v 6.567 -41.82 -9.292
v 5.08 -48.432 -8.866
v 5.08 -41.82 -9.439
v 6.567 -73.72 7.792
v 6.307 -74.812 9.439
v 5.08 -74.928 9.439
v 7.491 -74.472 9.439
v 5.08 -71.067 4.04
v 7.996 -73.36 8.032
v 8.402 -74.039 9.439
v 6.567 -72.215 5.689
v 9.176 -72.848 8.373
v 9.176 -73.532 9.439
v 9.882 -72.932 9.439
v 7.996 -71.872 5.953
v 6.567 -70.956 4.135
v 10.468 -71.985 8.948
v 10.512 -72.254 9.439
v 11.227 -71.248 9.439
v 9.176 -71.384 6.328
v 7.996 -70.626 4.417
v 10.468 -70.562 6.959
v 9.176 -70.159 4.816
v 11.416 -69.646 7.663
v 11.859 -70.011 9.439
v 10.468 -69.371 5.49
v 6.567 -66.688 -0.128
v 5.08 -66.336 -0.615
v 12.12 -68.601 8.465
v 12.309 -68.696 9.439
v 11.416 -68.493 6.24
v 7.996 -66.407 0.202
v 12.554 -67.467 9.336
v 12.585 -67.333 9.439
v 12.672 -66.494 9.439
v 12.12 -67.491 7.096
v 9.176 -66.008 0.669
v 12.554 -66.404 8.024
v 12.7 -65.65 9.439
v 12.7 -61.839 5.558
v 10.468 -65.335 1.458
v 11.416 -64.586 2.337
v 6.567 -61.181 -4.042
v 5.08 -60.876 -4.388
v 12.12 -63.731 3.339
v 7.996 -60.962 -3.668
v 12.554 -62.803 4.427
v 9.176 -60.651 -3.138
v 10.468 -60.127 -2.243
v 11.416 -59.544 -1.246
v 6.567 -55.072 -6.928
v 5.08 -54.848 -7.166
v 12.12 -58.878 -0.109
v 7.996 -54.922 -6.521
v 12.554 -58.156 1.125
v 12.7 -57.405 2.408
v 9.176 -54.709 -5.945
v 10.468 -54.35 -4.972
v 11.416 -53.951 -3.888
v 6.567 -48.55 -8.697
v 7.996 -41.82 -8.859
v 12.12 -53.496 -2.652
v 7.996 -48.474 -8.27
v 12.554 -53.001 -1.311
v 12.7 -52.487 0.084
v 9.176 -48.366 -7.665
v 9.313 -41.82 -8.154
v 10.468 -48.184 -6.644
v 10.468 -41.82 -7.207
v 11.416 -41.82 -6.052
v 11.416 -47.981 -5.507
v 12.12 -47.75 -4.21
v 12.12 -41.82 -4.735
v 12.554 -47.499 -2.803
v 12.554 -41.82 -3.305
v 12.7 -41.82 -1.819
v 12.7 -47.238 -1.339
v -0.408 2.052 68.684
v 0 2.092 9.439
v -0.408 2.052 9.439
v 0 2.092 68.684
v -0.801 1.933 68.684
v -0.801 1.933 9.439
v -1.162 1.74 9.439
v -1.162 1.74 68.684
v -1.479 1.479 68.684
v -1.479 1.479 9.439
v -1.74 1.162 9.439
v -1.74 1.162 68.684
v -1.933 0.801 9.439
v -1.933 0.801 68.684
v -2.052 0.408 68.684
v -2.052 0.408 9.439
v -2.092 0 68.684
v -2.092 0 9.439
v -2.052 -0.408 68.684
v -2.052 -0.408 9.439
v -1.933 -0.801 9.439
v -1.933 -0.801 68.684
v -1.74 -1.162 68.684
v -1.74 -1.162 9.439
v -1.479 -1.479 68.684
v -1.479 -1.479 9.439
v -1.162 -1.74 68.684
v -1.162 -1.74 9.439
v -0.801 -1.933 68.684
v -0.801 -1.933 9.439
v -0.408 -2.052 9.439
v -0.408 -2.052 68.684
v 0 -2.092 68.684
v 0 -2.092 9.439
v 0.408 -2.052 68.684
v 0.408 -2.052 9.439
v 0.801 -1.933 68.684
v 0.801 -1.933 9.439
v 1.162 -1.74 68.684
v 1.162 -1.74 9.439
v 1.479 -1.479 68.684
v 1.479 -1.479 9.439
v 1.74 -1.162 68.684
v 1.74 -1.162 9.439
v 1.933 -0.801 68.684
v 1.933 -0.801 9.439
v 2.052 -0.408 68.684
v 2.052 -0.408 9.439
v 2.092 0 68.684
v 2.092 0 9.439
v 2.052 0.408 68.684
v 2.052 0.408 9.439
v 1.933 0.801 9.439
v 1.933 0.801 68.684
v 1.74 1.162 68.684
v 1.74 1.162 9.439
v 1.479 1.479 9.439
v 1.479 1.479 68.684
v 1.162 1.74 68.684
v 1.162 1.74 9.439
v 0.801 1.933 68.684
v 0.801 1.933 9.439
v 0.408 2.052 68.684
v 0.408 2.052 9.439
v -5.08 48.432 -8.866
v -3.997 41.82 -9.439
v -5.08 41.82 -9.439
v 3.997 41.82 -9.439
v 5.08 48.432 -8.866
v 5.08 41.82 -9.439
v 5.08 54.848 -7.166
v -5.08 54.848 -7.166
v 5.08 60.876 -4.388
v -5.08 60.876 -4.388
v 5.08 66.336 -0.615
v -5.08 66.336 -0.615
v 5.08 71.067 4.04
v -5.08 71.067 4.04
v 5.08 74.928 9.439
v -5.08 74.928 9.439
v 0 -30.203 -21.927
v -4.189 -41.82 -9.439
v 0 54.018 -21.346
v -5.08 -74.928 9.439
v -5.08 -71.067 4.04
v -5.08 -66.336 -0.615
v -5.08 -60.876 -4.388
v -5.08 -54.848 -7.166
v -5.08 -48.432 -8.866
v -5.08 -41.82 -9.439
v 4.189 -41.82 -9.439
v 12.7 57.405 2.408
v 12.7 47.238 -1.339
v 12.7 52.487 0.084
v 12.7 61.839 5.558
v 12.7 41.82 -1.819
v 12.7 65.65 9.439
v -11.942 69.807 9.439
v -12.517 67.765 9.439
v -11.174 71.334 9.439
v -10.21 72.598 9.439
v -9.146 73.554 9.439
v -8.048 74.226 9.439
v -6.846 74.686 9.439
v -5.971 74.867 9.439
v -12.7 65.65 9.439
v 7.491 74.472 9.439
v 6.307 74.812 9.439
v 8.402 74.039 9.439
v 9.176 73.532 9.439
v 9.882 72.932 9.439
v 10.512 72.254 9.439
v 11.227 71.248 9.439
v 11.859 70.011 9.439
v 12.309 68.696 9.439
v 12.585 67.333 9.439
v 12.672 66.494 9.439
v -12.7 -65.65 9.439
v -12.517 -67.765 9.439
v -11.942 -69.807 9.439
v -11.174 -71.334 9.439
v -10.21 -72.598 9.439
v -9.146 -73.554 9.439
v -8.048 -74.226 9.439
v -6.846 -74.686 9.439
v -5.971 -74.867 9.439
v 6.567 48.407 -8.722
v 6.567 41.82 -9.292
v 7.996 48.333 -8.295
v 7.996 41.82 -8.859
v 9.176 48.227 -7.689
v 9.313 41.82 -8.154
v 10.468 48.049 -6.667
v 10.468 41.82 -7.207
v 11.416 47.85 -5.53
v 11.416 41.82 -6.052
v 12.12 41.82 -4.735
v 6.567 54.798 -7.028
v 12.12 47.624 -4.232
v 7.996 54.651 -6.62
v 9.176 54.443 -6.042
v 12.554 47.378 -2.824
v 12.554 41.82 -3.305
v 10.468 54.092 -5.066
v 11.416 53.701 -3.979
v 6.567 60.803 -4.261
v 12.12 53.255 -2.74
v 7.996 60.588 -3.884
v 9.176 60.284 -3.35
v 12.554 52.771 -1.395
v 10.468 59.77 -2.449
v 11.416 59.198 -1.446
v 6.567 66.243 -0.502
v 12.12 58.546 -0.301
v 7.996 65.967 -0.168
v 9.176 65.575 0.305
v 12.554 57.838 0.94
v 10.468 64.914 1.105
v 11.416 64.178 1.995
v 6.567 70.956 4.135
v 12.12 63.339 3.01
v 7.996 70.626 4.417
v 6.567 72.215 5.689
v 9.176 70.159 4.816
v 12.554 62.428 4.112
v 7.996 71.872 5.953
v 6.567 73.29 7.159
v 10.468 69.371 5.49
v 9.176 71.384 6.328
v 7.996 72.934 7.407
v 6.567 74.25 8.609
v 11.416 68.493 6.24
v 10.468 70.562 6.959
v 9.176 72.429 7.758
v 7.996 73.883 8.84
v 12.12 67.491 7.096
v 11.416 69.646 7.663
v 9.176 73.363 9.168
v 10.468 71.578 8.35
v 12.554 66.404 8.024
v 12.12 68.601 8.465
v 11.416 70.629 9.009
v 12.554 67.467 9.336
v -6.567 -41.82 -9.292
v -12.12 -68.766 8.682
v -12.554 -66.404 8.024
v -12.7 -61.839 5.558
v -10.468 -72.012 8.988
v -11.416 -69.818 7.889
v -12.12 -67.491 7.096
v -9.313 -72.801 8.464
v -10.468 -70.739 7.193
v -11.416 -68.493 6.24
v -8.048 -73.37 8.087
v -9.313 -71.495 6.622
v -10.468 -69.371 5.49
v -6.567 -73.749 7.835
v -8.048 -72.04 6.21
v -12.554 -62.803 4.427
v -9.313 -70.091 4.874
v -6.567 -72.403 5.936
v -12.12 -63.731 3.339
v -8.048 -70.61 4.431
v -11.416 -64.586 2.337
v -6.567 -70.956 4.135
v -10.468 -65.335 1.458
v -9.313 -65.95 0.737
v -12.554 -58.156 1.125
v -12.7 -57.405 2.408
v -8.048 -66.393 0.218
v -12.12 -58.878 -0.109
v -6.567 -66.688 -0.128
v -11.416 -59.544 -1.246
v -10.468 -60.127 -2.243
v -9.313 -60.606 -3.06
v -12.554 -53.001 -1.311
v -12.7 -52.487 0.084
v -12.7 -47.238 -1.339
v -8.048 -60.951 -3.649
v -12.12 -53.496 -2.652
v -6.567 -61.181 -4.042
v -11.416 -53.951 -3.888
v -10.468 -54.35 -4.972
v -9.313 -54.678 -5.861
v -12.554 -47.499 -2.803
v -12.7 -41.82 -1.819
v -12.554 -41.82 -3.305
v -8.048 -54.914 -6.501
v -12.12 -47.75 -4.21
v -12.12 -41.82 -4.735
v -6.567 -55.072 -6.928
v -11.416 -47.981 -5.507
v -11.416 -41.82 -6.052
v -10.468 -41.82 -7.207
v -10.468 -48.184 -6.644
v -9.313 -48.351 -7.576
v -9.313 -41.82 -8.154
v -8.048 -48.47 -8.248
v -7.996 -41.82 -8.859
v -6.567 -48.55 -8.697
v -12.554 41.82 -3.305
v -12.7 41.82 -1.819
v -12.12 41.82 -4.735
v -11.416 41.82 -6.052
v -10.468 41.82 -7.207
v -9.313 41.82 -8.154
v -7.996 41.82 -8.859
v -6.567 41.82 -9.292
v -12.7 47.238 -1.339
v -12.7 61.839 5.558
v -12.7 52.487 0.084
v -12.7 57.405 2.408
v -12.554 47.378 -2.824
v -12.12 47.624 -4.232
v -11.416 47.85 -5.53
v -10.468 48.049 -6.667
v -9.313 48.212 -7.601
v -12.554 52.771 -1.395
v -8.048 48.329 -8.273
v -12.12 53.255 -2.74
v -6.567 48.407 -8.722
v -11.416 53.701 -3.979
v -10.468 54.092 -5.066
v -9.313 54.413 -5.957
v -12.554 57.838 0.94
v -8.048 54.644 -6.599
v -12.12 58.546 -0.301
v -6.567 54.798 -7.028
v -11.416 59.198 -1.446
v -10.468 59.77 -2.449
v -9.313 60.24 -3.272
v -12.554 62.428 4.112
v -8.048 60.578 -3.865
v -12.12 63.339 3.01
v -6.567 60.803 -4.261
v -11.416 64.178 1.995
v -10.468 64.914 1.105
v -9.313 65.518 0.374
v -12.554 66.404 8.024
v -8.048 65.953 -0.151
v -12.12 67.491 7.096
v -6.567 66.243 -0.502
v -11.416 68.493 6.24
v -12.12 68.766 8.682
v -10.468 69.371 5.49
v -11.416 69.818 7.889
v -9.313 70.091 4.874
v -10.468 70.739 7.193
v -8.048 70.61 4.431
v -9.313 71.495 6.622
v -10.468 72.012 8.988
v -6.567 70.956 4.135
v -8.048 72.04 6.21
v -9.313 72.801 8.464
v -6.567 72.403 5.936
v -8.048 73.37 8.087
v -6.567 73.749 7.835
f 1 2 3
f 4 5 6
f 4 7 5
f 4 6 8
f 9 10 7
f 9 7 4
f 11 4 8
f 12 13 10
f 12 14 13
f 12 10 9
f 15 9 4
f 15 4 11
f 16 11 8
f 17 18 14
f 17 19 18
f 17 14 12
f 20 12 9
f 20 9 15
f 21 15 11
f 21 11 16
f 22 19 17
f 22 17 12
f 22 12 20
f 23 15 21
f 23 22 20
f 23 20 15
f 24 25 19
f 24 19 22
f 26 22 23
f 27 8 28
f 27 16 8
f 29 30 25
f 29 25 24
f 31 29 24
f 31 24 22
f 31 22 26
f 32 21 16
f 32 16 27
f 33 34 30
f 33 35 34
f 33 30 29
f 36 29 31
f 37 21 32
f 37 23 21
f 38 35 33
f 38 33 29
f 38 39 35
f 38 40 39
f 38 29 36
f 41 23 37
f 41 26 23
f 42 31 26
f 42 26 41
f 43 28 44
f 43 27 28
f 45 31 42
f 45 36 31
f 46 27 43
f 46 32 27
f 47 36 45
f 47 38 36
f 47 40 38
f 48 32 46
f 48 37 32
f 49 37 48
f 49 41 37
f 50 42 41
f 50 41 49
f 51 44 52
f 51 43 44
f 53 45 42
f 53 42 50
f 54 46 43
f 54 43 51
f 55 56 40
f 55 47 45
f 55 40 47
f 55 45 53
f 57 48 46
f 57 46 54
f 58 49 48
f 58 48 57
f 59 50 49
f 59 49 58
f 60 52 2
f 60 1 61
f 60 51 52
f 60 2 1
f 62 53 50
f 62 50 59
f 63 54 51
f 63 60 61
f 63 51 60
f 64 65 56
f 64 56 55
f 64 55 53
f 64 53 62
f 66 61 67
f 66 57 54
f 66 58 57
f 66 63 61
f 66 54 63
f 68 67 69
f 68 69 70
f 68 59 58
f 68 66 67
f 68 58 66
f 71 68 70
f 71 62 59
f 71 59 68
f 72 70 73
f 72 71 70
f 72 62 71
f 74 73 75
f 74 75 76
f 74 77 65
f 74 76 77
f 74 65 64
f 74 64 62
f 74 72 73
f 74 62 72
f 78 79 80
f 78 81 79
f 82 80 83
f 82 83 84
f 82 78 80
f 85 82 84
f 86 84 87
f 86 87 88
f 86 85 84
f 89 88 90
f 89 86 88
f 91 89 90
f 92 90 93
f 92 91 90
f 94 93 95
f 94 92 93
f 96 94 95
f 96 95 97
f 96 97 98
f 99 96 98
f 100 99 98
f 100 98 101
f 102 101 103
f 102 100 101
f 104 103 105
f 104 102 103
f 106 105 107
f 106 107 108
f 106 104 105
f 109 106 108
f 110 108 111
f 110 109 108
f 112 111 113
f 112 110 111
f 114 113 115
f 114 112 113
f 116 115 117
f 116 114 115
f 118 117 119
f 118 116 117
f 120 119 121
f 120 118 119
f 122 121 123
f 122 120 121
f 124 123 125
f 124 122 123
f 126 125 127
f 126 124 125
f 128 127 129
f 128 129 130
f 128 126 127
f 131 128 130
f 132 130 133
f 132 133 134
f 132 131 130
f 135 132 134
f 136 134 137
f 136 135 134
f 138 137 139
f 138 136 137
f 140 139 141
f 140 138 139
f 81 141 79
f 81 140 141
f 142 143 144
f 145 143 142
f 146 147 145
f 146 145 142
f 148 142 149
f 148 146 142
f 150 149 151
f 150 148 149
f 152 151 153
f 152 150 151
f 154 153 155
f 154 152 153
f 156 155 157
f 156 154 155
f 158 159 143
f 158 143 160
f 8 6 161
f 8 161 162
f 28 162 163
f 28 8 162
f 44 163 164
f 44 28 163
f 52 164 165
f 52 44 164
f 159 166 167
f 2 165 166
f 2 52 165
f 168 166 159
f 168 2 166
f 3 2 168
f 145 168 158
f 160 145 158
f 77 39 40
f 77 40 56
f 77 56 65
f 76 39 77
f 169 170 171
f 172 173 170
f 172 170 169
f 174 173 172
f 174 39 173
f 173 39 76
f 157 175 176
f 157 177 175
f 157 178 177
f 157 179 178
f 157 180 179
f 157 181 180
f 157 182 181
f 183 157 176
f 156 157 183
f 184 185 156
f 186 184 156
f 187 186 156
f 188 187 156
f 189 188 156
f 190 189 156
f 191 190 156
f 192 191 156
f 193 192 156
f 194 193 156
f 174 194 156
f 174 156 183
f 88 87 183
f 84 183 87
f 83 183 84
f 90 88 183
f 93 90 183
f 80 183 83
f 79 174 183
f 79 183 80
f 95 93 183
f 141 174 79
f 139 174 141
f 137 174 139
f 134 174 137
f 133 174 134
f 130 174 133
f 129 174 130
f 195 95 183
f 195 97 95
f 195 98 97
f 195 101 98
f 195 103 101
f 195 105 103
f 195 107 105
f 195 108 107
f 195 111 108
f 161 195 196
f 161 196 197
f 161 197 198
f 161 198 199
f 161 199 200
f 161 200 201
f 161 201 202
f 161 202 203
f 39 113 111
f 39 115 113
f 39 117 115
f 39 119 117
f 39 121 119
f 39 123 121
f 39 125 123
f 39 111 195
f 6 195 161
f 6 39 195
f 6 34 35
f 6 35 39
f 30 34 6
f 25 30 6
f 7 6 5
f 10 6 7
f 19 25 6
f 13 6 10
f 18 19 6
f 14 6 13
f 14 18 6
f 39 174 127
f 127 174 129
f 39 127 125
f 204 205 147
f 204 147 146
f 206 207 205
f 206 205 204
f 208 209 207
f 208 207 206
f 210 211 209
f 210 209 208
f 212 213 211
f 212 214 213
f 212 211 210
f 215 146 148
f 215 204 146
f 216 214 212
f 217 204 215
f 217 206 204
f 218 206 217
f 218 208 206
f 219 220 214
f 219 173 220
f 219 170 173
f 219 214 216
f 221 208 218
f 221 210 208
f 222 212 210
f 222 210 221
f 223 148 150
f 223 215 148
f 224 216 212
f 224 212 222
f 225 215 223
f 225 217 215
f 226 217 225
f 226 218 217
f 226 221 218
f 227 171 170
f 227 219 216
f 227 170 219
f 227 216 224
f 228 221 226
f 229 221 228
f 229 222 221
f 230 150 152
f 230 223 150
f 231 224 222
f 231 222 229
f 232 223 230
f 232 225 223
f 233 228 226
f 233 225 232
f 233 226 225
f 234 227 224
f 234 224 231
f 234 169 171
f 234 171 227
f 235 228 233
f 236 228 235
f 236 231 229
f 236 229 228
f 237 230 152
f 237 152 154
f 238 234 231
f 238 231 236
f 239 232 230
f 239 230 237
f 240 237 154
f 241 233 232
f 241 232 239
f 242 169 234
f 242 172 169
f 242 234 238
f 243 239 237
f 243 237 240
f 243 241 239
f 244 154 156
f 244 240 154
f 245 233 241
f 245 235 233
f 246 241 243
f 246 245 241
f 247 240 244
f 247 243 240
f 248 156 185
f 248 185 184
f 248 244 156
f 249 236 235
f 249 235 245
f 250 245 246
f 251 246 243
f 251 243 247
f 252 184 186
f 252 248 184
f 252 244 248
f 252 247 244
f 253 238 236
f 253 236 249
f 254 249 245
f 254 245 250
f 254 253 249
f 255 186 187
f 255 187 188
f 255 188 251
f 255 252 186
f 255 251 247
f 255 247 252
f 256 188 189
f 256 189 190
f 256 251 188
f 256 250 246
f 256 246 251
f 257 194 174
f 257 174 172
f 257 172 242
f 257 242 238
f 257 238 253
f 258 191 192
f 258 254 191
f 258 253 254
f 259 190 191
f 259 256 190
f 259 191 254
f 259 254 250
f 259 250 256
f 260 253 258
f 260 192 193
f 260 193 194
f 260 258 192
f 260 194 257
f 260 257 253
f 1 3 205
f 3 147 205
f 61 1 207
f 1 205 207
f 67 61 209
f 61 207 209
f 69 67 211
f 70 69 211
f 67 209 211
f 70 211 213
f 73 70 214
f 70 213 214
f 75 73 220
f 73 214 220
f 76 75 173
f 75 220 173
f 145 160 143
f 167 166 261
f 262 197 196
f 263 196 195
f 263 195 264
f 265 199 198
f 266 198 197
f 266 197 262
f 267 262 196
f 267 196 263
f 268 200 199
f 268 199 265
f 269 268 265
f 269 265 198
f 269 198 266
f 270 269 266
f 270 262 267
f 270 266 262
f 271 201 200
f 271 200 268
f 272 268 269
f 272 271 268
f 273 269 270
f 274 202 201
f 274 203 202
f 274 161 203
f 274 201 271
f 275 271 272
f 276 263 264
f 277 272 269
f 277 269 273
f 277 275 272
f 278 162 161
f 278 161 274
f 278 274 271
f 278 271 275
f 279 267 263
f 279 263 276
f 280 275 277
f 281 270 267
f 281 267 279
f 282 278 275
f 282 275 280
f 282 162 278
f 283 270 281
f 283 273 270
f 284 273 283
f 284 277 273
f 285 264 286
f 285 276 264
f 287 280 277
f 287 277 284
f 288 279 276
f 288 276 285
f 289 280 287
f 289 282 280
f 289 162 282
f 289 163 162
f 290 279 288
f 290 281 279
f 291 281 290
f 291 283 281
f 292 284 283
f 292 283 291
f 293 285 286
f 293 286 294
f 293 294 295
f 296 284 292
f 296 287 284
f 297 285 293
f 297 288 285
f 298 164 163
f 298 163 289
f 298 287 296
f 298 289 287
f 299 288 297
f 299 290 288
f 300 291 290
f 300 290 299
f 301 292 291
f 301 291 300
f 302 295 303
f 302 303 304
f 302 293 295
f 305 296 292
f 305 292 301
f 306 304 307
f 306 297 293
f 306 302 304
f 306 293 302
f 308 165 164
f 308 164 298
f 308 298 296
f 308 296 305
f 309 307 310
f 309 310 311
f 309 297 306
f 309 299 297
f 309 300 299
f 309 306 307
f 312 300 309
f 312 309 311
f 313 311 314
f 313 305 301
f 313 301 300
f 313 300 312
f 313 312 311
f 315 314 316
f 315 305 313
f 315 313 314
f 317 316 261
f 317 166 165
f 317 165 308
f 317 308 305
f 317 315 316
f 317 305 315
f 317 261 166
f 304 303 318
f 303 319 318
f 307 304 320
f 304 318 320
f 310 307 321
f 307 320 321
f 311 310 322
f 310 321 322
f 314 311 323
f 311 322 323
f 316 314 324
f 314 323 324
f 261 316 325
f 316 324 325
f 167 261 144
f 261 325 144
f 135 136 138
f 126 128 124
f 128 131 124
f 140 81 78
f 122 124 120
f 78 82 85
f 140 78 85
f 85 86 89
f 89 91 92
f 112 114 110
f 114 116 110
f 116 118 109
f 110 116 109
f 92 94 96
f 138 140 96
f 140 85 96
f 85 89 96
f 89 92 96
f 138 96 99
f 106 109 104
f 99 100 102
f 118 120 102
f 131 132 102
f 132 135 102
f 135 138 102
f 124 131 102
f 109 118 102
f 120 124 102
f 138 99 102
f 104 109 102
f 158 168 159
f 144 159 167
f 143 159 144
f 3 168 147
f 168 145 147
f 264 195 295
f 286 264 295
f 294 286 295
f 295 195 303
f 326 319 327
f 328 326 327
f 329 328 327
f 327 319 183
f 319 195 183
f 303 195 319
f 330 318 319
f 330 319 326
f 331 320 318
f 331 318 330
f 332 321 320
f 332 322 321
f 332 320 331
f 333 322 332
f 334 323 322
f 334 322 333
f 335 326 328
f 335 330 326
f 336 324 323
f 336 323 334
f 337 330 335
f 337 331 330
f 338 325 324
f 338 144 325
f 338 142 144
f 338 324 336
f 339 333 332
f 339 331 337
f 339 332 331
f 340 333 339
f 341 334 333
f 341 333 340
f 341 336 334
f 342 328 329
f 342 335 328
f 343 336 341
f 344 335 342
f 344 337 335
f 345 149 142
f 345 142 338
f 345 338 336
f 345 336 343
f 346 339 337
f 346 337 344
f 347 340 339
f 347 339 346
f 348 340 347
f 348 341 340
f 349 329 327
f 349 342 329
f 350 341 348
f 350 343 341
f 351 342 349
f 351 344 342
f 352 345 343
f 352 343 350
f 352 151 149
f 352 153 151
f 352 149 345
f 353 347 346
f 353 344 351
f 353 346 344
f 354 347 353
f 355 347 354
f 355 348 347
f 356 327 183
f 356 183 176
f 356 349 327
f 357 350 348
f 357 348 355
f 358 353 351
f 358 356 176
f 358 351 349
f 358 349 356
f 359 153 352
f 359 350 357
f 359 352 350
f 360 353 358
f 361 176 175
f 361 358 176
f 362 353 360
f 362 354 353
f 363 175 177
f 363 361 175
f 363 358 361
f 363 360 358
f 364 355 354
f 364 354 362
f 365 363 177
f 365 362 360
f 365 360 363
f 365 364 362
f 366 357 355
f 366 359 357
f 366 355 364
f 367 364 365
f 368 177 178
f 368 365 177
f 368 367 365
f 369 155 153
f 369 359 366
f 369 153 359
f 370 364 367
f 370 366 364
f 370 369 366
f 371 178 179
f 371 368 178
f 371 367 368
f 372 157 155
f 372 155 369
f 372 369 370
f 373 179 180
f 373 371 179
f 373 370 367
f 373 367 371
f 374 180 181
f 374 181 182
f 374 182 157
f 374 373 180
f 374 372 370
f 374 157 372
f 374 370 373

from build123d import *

# Parameters (mm, degrees)
F0_W        = 83.6402177811
F0_H        = 18.8771318644
F1_DEPTH    = 12.7
F2_DEPTH    = 6.35
F3_T4_DEPTH = 183.094881238
F4_T4_DEPTH = 183.094881238
F5_R        = 7.62
F6_R        = 7.62
F7_W        = 2.0920878742
F7_H        = 68.6837211251


# Not quite as in the source:
# - a fillet or chamfer that OpenCascade refuses, or shapes differently, is made with other operations: its cross-section is extruded or revolved along the edge and cut away or added


with BuildPart() as f1:
    # F0 (on Right) → F1 (new body, symmetric)
    with BuildSketch(Plane.YZ):
        with BuildLine():
            ThreePointArc((-74.9276950955, 9.4385659322), (-60.8756748212, -4.3877247968), (-41.8201088905, -9.4385659322))
            Line((-41.8201088905, -9.4385659322), (-74.9276950955, 9.4385659322))
        make_face()
        with BuildLine():
            Line((74.9276950955, 9.4385659322), (41.8201088905, -9.4385659322))
            ThreePointArc((41.8201088905, -9.4385659322), (60.8756748212, -4.3877247968), (74.9276950955, 9.4385659322))
        make_face()
        Polygon((74.9276950955, 9.4385659322), (41.8201088905, 9.4385659322), (41.8201088905, -9.4385659322), align=None)
        Rectangle(F0_W, F0_H)
        Polygon((-41.8201088905, -9.4385659322), (-41.8201088905, 9.4385659322), (-74.9276950955, 9.4385659322), align=None)
    extrude(amount=F1_DEPTH, both=True)

    # F0 (on Right) → F2 (join, symmetric)
    with BuildSketch(Plane.YZ):
        Polygon((41.8201088905, -9.4385659322), (-41.8201088905, -9.4385659322), (-30.2034132183, -21.926516667), (54.0176406503, -21.3456805795), align=None)
    extrude(amount=F2_DEPTH, both=True)

    # F3: chamfer of 19.05 x 6.35 on 1 edges, made by hand


with BuildPart() as f3_tool2:
    # F3_s3 → F3_t4 (new body)
    with BuildSketch(Plane(origin=(0, -79.7879238623, -0.5502627122), x_dir=(1, 0, 0), z_dir=(0, 0.9999762195, 0.0068964024))):
        Polygon((-6.35, 2.6677003539), (0, 21.7177003539), (-6.35, 21.7177003539), align=None)
    extrude(amount=F3_T4_DEPTH)

    split(bisect_by=Plane.XY.offset(-9.4385659322), keep=Keep.BOTTOM)


with BuildPart() as f1_1:
    add(f1.part)

    # F3_t1: cut F3_tool2
    add(f3_tool2.part, mode=Mode.SUBTRACT)

    # F4: chamfer of 6.35 x 19.05 on 1 edges, made by hand


with BuildPart() as f4_tool2:
    # F4_s3 → F4_t4 (new body)
    with BuildSketch(Plane(origin=(0, -79.7879238623, -0.5502627122), x_dir=(1, 0, 0), z_dir=(0, 0.9999762195, 0.0068964024))):
        Polygon((6.35, 2.6677003539), (0, 21.7177003539), (6.35, 21.7177003539), align=None)
    extrude(amount=F4_T4_DEPTH)

    split(bisect_by=Plane.XY.offset(-9.4385659322), keep=Keep.BOTTOM)


with BuildPart() as f1_2:
    add(f1_1.part)

    # F4_t1: cut F4_tool2
    add(f4_tool2.part, mode=Mode.SUBTRACT)

    # F5
    f5_edges = [f1_2.edges().sort_by_distance(p)[0] for p in [
        (-12.7, 60.875675, -4.387725),
        (-12.7, 0, -9.438566),
        (-12.7, -60.875675, -4.387725),
    ]]
    fillet(f5_edges, radius=F5_R)

    # F6
    f6_edges = [f1_2.edges().sort_by_distance(p)[0] for p in [
        (12.7, -60.875675, -4.387725),
        (12.7, 0, -9.438566),
        (12.7, 60.875675, -4.387725),
    ]]
    fillet(f6_edges, radius=F6_R)

    # F7 (on Right) → F8 (revolve)
    with BuildSketch(Plane.YZ):
        with Locations((1.0460439371, 34.3418605626)):
            Rectangle(F7_W, F7_H)
    revolve(axis=Axis((0, 0, 34.3418605626), (0, 0, 1)))


solid = f1_2.part
